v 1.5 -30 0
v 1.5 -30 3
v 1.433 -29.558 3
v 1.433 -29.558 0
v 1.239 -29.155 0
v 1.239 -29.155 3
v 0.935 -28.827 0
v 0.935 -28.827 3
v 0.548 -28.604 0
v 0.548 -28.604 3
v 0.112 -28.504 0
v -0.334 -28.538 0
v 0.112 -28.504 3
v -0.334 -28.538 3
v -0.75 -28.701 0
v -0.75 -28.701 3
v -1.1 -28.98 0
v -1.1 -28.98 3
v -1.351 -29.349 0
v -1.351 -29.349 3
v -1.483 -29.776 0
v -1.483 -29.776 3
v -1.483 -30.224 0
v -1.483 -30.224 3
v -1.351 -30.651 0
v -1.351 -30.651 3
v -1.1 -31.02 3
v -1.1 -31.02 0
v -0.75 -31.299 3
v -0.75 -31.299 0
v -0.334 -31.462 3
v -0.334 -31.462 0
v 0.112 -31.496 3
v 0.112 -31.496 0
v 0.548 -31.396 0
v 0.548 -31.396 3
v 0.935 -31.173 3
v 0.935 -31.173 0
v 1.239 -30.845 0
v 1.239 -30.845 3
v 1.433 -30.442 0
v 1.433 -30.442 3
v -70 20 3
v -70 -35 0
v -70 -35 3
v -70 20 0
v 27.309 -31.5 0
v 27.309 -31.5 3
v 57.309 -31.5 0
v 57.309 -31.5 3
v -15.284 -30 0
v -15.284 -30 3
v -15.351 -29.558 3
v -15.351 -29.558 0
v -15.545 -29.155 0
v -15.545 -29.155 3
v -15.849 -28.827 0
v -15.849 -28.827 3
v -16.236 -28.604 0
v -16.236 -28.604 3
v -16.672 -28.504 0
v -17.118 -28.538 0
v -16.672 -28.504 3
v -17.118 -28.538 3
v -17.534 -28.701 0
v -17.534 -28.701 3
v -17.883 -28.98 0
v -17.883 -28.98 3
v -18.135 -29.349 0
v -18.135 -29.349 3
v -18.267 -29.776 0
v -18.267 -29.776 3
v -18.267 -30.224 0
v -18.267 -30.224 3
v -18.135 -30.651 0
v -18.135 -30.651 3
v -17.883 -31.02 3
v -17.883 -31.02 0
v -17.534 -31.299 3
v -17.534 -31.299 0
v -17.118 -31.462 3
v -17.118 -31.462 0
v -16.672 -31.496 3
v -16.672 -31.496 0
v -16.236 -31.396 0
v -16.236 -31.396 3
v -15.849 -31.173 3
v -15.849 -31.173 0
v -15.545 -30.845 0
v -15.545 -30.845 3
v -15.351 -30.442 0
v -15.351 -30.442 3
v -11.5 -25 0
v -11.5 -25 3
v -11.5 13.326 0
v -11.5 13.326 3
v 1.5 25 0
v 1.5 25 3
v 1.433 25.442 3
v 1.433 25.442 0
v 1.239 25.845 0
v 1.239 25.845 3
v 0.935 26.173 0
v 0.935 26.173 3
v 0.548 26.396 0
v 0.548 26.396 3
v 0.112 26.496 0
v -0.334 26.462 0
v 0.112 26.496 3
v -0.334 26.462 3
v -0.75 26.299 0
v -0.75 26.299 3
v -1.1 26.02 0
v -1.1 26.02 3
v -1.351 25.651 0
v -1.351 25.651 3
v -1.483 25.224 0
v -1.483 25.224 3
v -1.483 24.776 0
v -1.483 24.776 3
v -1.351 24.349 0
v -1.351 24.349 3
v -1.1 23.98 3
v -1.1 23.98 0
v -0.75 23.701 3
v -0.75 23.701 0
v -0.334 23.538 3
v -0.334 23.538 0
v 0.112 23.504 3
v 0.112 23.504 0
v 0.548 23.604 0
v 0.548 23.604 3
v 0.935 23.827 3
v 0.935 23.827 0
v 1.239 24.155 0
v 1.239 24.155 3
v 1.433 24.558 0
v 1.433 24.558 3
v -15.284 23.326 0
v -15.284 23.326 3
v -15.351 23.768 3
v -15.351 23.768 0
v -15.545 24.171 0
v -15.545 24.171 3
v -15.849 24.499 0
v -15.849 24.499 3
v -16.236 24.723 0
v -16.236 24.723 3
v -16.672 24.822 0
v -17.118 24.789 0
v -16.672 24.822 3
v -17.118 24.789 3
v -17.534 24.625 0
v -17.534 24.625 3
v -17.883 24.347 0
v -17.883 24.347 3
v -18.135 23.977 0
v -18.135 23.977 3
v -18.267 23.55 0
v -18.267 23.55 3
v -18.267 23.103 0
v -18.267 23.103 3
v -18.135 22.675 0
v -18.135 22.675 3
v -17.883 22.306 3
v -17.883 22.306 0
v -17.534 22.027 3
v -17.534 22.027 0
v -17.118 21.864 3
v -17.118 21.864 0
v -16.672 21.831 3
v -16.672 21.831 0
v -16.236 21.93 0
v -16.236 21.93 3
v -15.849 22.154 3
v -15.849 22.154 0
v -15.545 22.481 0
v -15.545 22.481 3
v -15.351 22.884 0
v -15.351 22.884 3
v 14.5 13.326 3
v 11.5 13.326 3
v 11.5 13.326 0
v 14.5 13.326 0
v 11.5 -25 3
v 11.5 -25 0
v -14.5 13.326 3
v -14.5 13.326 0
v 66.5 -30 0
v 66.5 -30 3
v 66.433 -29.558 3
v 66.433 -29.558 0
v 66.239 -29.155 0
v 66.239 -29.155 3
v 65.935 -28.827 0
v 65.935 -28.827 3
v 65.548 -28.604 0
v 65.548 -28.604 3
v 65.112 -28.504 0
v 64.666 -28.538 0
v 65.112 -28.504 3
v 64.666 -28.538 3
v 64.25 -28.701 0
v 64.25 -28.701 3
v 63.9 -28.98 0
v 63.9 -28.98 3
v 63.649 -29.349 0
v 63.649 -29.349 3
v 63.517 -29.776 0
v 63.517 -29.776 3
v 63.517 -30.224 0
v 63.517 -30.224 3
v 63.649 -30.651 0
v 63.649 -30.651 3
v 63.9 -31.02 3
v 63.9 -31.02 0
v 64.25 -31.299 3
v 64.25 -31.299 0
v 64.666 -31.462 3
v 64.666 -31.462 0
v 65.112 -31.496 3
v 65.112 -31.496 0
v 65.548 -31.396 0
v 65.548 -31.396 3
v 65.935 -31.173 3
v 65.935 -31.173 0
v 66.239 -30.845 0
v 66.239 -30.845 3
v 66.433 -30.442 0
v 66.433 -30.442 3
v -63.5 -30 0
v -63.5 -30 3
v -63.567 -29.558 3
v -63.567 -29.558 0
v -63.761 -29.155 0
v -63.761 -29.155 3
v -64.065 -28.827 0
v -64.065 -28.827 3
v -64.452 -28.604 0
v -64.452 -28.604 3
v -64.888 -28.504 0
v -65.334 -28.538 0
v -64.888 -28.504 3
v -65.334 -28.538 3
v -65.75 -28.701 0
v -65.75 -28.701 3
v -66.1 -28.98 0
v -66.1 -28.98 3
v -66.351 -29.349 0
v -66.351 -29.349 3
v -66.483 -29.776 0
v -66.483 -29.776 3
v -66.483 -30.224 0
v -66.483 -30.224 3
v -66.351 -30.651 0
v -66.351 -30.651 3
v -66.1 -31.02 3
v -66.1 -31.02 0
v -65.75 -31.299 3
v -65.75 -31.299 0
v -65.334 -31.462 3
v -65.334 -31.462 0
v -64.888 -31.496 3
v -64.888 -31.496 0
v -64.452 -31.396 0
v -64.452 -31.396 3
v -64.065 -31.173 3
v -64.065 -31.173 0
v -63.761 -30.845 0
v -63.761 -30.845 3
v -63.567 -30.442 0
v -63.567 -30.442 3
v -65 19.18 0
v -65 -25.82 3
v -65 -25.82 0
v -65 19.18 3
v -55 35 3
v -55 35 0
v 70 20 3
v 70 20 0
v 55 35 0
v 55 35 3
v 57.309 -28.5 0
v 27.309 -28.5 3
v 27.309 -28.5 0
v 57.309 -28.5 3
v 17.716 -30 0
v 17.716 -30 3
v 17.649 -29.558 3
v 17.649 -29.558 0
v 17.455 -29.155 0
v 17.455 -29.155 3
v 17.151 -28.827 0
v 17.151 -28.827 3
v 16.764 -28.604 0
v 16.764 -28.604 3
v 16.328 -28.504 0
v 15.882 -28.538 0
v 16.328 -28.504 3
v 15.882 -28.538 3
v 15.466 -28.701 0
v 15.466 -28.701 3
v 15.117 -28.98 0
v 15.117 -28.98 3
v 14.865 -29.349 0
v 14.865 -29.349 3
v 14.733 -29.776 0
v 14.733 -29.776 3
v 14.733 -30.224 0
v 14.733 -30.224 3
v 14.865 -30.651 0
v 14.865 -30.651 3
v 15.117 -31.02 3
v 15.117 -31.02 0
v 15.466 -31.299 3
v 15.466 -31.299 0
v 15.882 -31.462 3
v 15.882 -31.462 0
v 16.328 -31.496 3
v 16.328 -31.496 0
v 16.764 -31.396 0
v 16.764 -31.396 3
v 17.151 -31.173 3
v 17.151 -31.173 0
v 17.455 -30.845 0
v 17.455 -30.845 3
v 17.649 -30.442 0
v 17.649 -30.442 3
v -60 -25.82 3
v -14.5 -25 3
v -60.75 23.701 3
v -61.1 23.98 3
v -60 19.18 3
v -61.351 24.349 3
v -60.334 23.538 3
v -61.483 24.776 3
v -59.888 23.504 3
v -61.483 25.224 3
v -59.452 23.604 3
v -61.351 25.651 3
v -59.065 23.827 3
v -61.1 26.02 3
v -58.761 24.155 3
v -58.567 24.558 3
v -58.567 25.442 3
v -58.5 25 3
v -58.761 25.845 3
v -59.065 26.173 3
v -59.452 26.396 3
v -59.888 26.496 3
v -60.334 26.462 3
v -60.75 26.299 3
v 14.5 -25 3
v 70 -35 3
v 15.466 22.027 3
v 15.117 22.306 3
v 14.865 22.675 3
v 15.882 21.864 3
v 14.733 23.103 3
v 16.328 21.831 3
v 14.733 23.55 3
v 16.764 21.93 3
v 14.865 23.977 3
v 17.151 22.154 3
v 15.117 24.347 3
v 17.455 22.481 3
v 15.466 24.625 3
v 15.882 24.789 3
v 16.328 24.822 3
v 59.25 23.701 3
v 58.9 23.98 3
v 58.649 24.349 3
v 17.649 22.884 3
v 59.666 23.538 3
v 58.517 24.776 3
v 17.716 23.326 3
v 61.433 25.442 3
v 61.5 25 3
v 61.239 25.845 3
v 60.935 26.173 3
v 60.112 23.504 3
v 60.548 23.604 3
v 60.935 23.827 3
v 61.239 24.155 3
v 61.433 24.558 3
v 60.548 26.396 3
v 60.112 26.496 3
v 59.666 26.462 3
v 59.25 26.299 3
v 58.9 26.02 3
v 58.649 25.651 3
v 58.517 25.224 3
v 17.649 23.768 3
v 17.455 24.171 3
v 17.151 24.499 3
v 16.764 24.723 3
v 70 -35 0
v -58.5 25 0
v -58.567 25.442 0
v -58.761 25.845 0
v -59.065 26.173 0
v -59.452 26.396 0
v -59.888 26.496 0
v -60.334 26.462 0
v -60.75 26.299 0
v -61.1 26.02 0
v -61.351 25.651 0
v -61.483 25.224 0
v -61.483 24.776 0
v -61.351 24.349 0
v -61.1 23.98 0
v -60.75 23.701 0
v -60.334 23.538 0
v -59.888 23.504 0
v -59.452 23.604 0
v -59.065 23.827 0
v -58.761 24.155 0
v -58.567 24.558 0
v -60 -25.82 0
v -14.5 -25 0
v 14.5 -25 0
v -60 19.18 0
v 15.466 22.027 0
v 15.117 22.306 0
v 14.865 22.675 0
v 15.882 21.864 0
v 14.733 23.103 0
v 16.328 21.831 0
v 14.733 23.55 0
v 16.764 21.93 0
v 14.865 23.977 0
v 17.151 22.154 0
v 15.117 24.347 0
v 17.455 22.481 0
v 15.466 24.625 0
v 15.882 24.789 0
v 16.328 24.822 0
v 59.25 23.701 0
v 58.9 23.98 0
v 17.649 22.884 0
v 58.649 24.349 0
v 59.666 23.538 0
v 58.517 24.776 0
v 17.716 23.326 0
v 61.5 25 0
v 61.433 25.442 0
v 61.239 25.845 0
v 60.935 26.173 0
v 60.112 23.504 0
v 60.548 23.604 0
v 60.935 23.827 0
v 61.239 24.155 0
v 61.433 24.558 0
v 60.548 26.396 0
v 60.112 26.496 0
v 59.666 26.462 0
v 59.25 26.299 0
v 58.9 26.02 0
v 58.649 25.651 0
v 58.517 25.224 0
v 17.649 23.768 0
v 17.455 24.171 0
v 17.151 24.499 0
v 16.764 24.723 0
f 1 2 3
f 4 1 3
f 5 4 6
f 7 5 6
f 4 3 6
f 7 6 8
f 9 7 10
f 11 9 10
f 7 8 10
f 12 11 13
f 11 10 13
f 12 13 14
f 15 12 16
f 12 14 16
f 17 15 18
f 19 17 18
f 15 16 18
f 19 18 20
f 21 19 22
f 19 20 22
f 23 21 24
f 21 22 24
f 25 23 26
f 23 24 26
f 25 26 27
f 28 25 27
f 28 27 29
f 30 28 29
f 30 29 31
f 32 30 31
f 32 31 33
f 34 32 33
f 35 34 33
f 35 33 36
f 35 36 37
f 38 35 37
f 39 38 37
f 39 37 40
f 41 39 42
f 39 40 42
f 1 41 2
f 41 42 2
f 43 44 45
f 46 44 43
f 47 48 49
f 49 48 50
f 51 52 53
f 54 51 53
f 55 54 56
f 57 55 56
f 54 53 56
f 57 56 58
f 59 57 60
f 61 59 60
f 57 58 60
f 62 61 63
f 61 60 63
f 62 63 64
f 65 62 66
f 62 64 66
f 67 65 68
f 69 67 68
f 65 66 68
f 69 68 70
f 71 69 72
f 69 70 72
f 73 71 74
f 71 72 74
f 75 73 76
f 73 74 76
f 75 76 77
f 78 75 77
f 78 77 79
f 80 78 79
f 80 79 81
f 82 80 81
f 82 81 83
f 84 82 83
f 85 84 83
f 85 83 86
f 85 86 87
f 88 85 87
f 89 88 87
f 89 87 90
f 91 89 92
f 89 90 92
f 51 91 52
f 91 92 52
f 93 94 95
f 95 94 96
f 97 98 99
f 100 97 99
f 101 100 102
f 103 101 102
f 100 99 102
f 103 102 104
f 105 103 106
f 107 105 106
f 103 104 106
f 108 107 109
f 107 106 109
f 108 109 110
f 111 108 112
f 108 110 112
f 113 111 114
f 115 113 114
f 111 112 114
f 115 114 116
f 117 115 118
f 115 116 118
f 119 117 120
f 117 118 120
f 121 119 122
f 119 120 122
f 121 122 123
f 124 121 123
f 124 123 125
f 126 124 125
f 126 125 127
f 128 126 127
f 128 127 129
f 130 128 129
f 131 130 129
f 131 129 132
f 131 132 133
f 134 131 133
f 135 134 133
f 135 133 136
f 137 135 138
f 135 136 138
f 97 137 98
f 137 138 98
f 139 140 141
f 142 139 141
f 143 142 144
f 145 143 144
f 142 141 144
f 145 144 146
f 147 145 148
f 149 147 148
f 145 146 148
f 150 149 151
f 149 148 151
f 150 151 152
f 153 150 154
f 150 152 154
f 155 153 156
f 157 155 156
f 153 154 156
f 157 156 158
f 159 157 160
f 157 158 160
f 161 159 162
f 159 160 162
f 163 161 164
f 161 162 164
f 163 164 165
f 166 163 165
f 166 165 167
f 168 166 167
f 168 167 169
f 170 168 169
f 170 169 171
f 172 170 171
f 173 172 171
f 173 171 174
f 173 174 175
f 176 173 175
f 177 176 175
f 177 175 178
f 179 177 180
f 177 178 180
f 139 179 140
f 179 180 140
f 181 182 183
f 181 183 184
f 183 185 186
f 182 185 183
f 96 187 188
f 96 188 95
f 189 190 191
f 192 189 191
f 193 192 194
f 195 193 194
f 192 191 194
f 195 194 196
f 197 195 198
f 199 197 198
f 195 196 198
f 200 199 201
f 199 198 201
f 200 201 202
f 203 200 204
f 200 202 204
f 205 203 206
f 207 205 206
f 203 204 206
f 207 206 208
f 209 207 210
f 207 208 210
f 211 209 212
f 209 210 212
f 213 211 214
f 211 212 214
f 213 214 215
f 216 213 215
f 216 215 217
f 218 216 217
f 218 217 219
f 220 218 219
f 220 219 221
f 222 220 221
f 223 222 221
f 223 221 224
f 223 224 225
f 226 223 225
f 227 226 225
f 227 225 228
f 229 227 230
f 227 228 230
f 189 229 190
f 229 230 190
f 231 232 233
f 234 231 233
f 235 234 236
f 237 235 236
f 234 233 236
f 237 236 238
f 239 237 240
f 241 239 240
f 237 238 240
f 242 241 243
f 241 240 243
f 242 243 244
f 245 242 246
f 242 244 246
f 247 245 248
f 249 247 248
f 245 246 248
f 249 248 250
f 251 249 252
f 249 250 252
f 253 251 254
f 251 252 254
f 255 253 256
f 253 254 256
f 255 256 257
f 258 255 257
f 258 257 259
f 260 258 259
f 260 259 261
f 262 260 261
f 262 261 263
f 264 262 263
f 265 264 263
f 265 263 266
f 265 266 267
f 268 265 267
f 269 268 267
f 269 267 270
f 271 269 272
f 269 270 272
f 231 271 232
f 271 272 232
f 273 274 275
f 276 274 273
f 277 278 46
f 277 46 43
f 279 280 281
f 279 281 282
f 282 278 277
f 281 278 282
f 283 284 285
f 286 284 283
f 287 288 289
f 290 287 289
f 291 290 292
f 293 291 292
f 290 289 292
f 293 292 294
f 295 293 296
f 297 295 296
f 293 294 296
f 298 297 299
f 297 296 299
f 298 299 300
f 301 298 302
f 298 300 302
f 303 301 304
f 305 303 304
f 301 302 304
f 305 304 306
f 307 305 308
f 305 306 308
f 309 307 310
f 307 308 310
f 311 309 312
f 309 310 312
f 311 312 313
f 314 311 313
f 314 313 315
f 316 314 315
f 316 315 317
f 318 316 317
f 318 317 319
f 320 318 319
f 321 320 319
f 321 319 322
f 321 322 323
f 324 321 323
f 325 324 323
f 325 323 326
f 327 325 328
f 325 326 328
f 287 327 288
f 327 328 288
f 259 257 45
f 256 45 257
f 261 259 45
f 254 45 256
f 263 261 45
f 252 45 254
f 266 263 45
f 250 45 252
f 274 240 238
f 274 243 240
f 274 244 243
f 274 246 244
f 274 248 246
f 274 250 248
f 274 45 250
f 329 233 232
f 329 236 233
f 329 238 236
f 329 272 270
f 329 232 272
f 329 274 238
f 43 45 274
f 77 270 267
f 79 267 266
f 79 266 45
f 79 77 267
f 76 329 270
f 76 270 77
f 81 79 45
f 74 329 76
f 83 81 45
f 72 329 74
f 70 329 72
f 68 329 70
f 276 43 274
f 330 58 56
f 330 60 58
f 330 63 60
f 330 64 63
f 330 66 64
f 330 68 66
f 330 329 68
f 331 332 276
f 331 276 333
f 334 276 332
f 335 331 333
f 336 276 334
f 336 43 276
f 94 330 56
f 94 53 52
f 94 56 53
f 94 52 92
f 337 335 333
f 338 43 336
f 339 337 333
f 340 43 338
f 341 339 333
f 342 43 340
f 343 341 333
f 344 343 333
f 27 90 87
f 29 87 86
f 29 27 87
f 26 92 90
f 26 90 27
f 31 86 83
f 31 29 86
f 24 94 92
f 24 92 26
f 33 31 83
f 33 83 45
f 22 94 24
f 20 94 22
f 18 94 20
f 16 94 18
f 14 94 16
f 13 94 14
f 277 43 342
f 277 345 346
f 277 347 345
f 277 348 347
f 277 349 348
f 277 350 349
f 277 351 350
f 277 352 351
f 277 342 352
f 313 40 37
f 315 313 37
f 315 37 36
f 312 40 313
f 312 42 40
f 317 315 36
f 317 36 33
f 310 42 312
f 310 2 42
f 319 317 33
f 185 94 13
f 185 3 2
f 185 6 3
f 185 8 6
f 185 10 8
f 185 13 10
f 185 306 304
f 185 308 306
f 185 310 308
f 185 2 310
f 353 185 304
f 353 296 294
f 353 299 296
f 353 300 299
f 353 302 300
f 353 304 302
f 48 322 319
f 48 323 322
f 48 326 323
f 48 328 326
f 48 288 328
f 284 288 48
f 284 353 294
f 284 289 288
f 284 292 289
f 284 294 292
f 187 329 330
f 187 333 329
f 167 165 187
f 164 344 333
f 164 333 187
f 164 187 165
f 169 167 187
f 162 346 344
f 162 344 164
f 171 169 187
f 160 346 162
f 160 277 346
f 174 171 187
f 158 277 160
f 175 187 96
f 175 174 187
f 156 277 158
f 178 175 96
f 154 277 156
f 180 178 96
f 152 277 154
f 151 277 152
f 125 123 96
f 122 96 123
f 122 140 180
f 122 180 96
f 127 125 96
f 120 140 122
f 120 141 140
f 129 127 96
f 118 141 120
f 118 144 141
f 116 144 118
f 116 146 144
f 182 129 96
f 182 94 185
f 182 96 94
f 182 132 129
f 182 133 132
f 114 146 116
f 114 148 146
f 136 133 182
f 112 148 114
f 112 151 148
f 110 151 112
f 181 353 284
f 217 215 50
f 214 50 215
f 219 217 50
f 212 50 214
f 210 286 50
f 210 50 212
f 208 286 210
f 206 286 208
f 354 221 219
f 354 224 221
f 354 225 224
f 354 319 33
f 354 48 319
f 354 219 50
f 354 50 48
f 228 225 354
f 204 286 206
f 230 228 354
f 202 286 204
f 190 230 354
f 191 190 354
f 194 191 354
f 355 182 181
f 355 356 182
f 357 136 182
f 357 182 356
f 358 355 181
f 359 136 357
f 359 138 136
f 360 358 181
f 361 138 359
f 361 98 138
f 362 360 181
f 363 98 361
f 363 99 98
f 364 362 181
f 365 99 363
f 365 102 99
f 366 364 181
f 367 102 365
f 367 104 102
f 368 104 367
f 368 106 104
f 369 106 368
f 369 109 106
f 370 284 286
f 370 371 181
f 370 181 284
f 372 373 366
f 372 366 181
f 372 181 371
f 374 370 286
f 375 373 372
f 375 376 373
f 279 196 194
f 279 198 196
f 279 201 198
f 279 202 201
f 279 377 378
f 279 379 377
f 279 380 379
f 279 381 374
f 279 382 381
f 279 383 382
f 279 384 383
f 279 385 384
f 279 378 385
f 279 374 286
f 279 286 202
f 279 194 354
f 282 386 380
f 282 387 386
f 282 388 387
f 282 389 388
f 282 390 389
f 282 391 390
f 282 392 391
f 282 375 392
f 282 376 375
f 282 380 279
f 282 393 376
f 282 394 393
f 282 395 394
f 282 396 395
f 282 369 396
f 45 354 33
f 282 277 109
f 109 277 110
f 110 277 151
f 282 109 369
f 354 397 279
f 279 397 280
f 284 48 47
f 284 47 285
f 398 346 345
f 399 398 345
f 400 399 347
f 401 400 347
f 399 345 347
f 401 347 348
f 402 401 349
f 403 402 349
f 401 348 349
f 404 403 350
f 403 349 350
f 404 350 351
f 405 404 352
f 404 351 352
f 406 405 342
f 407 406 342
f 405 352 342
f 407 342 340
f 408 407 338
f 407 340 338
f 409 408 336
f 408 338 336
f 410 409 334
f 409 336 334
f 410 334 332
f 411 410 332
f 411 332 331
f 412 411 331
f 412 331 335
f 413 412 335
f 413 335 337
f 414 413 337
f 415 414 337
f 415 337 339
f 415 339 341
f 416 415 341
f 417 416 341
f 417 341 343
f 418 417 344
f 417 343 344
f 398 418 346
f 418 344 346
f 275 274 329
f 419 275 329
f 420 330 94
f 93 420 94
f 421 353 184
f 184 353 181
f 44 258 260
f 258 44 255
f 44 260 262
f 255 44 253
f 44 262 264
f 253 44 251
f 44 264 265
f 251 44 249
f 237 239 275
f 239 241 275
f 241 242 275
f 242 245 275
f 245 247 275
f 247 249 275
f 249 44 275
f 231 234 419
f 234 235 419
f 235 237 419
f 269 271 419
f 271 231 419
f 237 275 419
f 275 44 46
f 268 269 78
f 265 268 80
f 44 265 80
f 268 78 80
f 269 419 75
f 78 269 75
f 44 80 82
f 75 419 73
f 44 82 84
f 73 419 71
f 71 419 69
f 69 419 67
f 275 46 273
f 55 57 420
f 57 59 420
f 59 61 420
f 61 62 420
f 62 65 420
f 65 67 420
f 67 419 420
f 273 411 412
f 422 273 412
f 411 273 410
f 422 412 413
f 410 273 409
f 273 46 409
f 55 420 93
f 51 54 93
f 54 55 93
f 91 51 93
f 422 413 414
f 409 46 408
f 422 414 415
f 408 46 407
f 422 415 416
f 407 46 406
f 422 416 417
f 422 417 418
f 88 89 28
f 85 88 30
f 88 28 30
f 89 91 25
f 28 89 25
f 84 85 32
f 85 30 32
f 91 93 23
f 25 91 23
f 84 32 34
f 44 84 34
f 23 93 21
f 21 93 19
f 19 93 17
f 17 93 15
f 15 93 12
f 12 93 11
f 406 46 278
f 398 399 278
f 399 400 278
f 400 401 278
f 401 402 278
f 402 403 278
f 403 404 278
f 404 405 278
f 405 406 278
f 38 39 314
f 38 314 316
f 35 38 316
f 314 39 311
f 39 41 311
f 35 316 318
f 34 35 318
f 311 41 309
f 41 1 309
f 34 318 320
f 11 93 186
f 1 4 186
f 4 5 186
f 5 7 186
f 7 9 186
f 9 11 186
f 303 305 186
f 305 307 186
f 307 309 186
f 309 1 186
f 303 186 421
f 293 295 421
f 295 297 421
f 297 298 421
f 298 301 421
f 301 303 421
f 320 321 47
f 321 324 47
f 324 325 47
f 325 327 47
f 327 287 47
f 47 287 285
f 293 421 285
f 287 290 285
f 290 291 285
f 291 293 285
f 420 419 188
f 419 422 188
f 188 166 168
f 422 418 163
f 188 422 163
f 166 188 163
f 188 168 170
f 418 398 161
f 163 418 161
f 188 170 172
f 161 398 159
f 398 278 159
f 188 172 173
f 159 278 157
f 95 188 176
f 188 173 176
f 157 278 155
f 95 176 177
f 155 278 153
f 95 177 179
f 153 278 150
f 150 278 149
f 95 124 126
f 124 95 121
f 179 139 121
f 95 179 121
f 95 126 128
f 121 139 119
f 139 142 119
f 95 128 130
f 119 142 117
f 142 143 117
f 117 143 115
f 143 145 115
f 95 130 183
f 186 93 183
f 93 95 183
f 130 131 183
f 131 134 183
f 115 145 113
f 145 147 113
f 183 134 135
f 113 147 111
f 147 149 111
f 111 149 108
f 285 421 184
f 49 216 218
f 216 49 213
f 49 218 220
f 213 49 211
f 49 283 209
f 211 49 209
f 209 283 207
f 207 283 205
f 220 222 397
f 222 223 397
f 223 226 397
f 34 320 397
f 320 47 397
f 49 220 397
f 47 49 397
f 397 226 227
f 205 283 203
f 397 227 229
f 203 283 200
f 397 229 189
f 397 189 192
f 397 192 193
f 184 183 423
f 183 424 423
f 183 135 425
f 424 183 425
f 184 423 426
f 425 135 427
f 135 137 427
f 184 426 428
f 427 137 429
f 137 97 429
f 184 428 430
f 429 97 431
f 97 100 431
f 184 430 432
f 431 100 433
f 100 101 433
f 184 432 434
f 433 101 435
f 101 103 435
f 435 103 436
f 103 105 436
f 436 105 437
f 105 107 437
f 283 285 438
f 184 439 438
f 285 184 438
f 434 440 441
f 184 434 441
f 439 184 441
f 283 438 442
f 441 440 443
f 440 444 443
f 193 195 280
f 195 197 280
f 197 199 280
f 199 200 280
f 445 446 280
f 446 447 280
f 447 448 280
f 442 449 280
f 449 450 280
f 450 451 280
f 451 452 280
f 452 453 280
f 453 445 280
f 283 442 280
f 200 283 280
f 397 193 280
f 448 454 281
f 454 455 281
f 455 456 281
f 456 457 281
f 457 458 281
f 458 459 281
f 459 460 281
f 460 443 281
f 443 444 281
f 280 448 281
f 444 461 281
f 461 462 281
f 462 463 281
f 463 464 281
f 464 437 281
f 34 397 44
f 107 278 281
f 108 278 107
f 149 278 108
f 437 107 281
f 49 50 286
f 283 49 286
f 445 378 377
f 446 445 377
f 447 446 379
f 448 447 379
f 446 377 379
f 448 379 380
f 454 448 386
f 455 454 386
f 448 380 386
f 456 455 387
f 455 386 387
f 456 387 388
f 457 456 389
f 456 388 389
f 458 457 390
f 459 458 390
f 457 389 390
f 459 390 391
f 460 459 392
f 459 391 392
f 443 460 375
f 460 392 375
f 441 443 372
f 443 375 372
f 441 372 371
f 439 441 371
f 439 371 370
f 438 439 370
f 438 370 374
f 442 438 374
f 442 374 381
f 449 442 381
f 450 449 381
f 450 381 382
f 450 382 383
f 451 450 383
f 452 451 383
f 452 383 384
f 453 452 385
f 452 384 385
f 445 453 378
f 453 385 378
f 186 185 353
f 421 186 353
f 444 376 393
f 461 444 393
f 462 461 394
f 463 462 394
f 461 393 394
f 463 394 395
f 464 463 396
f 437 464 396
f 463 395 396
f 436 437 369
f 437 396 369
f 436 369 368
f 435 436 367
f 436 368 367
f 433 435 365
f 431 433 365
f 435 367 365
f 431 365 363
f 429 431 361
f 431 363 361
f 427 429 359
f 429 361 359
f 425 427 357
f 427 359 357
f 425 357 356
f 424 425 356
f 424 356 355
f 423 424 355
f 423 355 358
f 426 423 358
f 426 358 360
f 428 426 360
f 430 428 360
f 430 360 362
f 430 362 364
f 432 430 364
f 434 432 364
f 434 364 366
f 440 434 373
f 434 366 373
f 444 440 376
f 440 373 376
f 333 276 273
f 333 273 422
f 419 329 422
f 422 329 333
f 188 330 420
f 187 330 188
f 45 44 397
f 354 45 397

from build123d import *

# Parameters (mm, degrees)
CROQUIS2_W              = 140
CROQUIS2_H              = 70
SALIENTE_EXTRUIR1_DEPTH = 3
CROQUIS3_R              = 1.5
CORTAR_EXTRUIR1_DEPTH   = 3
CHAFL_N2_SIZE           = 15
CROQUIS4_R              = 1.5
CROQUIS4_W              = 3
CROQUIS4_H              = 38.326321521
CROQUIS4_W_2            = 30
CROQUIS4_H_2            = 3
CROQUIS4_W_3            = 5
CROQUIS4_H_3            = 45
CORTAR_EXTRUIR2_DEPTH   = 3


with BuildPart() as part:
    # Croquis2 → Saliente-Extruir1 (new body)
    with BuildSketch(Plane.XY):
        Rectangle(CROQUIS2_W, CROQUIS2_H)
    extrude(amount=SALIENTE_EXTRUIR1_DEPTH)

    # Croquis3 → Cortar-Extruir1 (cut)
    with BuildSketch(Plane.XY.offset(3)):
        with Locations((-65, -30)):
            Circle(CROQUIS3_R)
        with Locations((65, -30)):
            Circle(CROQUIS3_R)
        with Locations((0, -30)):
            Circle(CROQUIS3_R)
        with Locations((-60, 25)):
            Circle(CROQUIS3_R)
        with Locations((60, 25)):
            Circle(CROQUIS3_R)
        with Locations((0, 25)):
            Circle(CROQUIS3_R)
    extrude(amount=-CORTAR_EXTRUIR1_DEPTH, mode=Mode.SUBTRACT)

    # Chaflán2
    chafl_n2_edges = [part.edges().sort_by_distance(p)[0] for p in [
        (-70, 35, 1.5),
        (70, 35, 1.5),
    ]]
    chamfer(chafl_n2_edges, length=CHAFL_N2_SIZE)

    # Croquis4 → Cortar-Extruir2 (cut)
    with BuildSketch(Plane.XY.offset(3)):
        with Locations((-16.783900612, 23.326321521)):
            Circle(CROQUIS4_R)
        with Locations((16.216099388, 23.326321521)):
            Circle(CROQUIS4_R)
        with Locations((-16.783900612, -30)):
            Circle(CROQUIS4_R)
        with Locations((16.216099388, -30)):
            Circle(CROQUIS4_R)
        with Locations((13, -5.836839239)):
            Rectangle(CROQUIS4_W, CROQUIS4_H)
        with Locations((-13, -5.836839239)):
            Rectangle(CROQUIS4_W, CROQUIS4_H)
        with Locations((42.309397606, -30)):
            Rectangle(CROQUIS4_W_2, CROQUIS4_H_2)
        with Locations((-62.5, -3.320076901)):
            Rectangle(CROQUIS4_W_3, CROQUIS4_H_3)
    extrude(amount=-CORTAR_EXTRUIR2_DEPTH, mode=Mode.SUBTRACT)


solid = part.part
